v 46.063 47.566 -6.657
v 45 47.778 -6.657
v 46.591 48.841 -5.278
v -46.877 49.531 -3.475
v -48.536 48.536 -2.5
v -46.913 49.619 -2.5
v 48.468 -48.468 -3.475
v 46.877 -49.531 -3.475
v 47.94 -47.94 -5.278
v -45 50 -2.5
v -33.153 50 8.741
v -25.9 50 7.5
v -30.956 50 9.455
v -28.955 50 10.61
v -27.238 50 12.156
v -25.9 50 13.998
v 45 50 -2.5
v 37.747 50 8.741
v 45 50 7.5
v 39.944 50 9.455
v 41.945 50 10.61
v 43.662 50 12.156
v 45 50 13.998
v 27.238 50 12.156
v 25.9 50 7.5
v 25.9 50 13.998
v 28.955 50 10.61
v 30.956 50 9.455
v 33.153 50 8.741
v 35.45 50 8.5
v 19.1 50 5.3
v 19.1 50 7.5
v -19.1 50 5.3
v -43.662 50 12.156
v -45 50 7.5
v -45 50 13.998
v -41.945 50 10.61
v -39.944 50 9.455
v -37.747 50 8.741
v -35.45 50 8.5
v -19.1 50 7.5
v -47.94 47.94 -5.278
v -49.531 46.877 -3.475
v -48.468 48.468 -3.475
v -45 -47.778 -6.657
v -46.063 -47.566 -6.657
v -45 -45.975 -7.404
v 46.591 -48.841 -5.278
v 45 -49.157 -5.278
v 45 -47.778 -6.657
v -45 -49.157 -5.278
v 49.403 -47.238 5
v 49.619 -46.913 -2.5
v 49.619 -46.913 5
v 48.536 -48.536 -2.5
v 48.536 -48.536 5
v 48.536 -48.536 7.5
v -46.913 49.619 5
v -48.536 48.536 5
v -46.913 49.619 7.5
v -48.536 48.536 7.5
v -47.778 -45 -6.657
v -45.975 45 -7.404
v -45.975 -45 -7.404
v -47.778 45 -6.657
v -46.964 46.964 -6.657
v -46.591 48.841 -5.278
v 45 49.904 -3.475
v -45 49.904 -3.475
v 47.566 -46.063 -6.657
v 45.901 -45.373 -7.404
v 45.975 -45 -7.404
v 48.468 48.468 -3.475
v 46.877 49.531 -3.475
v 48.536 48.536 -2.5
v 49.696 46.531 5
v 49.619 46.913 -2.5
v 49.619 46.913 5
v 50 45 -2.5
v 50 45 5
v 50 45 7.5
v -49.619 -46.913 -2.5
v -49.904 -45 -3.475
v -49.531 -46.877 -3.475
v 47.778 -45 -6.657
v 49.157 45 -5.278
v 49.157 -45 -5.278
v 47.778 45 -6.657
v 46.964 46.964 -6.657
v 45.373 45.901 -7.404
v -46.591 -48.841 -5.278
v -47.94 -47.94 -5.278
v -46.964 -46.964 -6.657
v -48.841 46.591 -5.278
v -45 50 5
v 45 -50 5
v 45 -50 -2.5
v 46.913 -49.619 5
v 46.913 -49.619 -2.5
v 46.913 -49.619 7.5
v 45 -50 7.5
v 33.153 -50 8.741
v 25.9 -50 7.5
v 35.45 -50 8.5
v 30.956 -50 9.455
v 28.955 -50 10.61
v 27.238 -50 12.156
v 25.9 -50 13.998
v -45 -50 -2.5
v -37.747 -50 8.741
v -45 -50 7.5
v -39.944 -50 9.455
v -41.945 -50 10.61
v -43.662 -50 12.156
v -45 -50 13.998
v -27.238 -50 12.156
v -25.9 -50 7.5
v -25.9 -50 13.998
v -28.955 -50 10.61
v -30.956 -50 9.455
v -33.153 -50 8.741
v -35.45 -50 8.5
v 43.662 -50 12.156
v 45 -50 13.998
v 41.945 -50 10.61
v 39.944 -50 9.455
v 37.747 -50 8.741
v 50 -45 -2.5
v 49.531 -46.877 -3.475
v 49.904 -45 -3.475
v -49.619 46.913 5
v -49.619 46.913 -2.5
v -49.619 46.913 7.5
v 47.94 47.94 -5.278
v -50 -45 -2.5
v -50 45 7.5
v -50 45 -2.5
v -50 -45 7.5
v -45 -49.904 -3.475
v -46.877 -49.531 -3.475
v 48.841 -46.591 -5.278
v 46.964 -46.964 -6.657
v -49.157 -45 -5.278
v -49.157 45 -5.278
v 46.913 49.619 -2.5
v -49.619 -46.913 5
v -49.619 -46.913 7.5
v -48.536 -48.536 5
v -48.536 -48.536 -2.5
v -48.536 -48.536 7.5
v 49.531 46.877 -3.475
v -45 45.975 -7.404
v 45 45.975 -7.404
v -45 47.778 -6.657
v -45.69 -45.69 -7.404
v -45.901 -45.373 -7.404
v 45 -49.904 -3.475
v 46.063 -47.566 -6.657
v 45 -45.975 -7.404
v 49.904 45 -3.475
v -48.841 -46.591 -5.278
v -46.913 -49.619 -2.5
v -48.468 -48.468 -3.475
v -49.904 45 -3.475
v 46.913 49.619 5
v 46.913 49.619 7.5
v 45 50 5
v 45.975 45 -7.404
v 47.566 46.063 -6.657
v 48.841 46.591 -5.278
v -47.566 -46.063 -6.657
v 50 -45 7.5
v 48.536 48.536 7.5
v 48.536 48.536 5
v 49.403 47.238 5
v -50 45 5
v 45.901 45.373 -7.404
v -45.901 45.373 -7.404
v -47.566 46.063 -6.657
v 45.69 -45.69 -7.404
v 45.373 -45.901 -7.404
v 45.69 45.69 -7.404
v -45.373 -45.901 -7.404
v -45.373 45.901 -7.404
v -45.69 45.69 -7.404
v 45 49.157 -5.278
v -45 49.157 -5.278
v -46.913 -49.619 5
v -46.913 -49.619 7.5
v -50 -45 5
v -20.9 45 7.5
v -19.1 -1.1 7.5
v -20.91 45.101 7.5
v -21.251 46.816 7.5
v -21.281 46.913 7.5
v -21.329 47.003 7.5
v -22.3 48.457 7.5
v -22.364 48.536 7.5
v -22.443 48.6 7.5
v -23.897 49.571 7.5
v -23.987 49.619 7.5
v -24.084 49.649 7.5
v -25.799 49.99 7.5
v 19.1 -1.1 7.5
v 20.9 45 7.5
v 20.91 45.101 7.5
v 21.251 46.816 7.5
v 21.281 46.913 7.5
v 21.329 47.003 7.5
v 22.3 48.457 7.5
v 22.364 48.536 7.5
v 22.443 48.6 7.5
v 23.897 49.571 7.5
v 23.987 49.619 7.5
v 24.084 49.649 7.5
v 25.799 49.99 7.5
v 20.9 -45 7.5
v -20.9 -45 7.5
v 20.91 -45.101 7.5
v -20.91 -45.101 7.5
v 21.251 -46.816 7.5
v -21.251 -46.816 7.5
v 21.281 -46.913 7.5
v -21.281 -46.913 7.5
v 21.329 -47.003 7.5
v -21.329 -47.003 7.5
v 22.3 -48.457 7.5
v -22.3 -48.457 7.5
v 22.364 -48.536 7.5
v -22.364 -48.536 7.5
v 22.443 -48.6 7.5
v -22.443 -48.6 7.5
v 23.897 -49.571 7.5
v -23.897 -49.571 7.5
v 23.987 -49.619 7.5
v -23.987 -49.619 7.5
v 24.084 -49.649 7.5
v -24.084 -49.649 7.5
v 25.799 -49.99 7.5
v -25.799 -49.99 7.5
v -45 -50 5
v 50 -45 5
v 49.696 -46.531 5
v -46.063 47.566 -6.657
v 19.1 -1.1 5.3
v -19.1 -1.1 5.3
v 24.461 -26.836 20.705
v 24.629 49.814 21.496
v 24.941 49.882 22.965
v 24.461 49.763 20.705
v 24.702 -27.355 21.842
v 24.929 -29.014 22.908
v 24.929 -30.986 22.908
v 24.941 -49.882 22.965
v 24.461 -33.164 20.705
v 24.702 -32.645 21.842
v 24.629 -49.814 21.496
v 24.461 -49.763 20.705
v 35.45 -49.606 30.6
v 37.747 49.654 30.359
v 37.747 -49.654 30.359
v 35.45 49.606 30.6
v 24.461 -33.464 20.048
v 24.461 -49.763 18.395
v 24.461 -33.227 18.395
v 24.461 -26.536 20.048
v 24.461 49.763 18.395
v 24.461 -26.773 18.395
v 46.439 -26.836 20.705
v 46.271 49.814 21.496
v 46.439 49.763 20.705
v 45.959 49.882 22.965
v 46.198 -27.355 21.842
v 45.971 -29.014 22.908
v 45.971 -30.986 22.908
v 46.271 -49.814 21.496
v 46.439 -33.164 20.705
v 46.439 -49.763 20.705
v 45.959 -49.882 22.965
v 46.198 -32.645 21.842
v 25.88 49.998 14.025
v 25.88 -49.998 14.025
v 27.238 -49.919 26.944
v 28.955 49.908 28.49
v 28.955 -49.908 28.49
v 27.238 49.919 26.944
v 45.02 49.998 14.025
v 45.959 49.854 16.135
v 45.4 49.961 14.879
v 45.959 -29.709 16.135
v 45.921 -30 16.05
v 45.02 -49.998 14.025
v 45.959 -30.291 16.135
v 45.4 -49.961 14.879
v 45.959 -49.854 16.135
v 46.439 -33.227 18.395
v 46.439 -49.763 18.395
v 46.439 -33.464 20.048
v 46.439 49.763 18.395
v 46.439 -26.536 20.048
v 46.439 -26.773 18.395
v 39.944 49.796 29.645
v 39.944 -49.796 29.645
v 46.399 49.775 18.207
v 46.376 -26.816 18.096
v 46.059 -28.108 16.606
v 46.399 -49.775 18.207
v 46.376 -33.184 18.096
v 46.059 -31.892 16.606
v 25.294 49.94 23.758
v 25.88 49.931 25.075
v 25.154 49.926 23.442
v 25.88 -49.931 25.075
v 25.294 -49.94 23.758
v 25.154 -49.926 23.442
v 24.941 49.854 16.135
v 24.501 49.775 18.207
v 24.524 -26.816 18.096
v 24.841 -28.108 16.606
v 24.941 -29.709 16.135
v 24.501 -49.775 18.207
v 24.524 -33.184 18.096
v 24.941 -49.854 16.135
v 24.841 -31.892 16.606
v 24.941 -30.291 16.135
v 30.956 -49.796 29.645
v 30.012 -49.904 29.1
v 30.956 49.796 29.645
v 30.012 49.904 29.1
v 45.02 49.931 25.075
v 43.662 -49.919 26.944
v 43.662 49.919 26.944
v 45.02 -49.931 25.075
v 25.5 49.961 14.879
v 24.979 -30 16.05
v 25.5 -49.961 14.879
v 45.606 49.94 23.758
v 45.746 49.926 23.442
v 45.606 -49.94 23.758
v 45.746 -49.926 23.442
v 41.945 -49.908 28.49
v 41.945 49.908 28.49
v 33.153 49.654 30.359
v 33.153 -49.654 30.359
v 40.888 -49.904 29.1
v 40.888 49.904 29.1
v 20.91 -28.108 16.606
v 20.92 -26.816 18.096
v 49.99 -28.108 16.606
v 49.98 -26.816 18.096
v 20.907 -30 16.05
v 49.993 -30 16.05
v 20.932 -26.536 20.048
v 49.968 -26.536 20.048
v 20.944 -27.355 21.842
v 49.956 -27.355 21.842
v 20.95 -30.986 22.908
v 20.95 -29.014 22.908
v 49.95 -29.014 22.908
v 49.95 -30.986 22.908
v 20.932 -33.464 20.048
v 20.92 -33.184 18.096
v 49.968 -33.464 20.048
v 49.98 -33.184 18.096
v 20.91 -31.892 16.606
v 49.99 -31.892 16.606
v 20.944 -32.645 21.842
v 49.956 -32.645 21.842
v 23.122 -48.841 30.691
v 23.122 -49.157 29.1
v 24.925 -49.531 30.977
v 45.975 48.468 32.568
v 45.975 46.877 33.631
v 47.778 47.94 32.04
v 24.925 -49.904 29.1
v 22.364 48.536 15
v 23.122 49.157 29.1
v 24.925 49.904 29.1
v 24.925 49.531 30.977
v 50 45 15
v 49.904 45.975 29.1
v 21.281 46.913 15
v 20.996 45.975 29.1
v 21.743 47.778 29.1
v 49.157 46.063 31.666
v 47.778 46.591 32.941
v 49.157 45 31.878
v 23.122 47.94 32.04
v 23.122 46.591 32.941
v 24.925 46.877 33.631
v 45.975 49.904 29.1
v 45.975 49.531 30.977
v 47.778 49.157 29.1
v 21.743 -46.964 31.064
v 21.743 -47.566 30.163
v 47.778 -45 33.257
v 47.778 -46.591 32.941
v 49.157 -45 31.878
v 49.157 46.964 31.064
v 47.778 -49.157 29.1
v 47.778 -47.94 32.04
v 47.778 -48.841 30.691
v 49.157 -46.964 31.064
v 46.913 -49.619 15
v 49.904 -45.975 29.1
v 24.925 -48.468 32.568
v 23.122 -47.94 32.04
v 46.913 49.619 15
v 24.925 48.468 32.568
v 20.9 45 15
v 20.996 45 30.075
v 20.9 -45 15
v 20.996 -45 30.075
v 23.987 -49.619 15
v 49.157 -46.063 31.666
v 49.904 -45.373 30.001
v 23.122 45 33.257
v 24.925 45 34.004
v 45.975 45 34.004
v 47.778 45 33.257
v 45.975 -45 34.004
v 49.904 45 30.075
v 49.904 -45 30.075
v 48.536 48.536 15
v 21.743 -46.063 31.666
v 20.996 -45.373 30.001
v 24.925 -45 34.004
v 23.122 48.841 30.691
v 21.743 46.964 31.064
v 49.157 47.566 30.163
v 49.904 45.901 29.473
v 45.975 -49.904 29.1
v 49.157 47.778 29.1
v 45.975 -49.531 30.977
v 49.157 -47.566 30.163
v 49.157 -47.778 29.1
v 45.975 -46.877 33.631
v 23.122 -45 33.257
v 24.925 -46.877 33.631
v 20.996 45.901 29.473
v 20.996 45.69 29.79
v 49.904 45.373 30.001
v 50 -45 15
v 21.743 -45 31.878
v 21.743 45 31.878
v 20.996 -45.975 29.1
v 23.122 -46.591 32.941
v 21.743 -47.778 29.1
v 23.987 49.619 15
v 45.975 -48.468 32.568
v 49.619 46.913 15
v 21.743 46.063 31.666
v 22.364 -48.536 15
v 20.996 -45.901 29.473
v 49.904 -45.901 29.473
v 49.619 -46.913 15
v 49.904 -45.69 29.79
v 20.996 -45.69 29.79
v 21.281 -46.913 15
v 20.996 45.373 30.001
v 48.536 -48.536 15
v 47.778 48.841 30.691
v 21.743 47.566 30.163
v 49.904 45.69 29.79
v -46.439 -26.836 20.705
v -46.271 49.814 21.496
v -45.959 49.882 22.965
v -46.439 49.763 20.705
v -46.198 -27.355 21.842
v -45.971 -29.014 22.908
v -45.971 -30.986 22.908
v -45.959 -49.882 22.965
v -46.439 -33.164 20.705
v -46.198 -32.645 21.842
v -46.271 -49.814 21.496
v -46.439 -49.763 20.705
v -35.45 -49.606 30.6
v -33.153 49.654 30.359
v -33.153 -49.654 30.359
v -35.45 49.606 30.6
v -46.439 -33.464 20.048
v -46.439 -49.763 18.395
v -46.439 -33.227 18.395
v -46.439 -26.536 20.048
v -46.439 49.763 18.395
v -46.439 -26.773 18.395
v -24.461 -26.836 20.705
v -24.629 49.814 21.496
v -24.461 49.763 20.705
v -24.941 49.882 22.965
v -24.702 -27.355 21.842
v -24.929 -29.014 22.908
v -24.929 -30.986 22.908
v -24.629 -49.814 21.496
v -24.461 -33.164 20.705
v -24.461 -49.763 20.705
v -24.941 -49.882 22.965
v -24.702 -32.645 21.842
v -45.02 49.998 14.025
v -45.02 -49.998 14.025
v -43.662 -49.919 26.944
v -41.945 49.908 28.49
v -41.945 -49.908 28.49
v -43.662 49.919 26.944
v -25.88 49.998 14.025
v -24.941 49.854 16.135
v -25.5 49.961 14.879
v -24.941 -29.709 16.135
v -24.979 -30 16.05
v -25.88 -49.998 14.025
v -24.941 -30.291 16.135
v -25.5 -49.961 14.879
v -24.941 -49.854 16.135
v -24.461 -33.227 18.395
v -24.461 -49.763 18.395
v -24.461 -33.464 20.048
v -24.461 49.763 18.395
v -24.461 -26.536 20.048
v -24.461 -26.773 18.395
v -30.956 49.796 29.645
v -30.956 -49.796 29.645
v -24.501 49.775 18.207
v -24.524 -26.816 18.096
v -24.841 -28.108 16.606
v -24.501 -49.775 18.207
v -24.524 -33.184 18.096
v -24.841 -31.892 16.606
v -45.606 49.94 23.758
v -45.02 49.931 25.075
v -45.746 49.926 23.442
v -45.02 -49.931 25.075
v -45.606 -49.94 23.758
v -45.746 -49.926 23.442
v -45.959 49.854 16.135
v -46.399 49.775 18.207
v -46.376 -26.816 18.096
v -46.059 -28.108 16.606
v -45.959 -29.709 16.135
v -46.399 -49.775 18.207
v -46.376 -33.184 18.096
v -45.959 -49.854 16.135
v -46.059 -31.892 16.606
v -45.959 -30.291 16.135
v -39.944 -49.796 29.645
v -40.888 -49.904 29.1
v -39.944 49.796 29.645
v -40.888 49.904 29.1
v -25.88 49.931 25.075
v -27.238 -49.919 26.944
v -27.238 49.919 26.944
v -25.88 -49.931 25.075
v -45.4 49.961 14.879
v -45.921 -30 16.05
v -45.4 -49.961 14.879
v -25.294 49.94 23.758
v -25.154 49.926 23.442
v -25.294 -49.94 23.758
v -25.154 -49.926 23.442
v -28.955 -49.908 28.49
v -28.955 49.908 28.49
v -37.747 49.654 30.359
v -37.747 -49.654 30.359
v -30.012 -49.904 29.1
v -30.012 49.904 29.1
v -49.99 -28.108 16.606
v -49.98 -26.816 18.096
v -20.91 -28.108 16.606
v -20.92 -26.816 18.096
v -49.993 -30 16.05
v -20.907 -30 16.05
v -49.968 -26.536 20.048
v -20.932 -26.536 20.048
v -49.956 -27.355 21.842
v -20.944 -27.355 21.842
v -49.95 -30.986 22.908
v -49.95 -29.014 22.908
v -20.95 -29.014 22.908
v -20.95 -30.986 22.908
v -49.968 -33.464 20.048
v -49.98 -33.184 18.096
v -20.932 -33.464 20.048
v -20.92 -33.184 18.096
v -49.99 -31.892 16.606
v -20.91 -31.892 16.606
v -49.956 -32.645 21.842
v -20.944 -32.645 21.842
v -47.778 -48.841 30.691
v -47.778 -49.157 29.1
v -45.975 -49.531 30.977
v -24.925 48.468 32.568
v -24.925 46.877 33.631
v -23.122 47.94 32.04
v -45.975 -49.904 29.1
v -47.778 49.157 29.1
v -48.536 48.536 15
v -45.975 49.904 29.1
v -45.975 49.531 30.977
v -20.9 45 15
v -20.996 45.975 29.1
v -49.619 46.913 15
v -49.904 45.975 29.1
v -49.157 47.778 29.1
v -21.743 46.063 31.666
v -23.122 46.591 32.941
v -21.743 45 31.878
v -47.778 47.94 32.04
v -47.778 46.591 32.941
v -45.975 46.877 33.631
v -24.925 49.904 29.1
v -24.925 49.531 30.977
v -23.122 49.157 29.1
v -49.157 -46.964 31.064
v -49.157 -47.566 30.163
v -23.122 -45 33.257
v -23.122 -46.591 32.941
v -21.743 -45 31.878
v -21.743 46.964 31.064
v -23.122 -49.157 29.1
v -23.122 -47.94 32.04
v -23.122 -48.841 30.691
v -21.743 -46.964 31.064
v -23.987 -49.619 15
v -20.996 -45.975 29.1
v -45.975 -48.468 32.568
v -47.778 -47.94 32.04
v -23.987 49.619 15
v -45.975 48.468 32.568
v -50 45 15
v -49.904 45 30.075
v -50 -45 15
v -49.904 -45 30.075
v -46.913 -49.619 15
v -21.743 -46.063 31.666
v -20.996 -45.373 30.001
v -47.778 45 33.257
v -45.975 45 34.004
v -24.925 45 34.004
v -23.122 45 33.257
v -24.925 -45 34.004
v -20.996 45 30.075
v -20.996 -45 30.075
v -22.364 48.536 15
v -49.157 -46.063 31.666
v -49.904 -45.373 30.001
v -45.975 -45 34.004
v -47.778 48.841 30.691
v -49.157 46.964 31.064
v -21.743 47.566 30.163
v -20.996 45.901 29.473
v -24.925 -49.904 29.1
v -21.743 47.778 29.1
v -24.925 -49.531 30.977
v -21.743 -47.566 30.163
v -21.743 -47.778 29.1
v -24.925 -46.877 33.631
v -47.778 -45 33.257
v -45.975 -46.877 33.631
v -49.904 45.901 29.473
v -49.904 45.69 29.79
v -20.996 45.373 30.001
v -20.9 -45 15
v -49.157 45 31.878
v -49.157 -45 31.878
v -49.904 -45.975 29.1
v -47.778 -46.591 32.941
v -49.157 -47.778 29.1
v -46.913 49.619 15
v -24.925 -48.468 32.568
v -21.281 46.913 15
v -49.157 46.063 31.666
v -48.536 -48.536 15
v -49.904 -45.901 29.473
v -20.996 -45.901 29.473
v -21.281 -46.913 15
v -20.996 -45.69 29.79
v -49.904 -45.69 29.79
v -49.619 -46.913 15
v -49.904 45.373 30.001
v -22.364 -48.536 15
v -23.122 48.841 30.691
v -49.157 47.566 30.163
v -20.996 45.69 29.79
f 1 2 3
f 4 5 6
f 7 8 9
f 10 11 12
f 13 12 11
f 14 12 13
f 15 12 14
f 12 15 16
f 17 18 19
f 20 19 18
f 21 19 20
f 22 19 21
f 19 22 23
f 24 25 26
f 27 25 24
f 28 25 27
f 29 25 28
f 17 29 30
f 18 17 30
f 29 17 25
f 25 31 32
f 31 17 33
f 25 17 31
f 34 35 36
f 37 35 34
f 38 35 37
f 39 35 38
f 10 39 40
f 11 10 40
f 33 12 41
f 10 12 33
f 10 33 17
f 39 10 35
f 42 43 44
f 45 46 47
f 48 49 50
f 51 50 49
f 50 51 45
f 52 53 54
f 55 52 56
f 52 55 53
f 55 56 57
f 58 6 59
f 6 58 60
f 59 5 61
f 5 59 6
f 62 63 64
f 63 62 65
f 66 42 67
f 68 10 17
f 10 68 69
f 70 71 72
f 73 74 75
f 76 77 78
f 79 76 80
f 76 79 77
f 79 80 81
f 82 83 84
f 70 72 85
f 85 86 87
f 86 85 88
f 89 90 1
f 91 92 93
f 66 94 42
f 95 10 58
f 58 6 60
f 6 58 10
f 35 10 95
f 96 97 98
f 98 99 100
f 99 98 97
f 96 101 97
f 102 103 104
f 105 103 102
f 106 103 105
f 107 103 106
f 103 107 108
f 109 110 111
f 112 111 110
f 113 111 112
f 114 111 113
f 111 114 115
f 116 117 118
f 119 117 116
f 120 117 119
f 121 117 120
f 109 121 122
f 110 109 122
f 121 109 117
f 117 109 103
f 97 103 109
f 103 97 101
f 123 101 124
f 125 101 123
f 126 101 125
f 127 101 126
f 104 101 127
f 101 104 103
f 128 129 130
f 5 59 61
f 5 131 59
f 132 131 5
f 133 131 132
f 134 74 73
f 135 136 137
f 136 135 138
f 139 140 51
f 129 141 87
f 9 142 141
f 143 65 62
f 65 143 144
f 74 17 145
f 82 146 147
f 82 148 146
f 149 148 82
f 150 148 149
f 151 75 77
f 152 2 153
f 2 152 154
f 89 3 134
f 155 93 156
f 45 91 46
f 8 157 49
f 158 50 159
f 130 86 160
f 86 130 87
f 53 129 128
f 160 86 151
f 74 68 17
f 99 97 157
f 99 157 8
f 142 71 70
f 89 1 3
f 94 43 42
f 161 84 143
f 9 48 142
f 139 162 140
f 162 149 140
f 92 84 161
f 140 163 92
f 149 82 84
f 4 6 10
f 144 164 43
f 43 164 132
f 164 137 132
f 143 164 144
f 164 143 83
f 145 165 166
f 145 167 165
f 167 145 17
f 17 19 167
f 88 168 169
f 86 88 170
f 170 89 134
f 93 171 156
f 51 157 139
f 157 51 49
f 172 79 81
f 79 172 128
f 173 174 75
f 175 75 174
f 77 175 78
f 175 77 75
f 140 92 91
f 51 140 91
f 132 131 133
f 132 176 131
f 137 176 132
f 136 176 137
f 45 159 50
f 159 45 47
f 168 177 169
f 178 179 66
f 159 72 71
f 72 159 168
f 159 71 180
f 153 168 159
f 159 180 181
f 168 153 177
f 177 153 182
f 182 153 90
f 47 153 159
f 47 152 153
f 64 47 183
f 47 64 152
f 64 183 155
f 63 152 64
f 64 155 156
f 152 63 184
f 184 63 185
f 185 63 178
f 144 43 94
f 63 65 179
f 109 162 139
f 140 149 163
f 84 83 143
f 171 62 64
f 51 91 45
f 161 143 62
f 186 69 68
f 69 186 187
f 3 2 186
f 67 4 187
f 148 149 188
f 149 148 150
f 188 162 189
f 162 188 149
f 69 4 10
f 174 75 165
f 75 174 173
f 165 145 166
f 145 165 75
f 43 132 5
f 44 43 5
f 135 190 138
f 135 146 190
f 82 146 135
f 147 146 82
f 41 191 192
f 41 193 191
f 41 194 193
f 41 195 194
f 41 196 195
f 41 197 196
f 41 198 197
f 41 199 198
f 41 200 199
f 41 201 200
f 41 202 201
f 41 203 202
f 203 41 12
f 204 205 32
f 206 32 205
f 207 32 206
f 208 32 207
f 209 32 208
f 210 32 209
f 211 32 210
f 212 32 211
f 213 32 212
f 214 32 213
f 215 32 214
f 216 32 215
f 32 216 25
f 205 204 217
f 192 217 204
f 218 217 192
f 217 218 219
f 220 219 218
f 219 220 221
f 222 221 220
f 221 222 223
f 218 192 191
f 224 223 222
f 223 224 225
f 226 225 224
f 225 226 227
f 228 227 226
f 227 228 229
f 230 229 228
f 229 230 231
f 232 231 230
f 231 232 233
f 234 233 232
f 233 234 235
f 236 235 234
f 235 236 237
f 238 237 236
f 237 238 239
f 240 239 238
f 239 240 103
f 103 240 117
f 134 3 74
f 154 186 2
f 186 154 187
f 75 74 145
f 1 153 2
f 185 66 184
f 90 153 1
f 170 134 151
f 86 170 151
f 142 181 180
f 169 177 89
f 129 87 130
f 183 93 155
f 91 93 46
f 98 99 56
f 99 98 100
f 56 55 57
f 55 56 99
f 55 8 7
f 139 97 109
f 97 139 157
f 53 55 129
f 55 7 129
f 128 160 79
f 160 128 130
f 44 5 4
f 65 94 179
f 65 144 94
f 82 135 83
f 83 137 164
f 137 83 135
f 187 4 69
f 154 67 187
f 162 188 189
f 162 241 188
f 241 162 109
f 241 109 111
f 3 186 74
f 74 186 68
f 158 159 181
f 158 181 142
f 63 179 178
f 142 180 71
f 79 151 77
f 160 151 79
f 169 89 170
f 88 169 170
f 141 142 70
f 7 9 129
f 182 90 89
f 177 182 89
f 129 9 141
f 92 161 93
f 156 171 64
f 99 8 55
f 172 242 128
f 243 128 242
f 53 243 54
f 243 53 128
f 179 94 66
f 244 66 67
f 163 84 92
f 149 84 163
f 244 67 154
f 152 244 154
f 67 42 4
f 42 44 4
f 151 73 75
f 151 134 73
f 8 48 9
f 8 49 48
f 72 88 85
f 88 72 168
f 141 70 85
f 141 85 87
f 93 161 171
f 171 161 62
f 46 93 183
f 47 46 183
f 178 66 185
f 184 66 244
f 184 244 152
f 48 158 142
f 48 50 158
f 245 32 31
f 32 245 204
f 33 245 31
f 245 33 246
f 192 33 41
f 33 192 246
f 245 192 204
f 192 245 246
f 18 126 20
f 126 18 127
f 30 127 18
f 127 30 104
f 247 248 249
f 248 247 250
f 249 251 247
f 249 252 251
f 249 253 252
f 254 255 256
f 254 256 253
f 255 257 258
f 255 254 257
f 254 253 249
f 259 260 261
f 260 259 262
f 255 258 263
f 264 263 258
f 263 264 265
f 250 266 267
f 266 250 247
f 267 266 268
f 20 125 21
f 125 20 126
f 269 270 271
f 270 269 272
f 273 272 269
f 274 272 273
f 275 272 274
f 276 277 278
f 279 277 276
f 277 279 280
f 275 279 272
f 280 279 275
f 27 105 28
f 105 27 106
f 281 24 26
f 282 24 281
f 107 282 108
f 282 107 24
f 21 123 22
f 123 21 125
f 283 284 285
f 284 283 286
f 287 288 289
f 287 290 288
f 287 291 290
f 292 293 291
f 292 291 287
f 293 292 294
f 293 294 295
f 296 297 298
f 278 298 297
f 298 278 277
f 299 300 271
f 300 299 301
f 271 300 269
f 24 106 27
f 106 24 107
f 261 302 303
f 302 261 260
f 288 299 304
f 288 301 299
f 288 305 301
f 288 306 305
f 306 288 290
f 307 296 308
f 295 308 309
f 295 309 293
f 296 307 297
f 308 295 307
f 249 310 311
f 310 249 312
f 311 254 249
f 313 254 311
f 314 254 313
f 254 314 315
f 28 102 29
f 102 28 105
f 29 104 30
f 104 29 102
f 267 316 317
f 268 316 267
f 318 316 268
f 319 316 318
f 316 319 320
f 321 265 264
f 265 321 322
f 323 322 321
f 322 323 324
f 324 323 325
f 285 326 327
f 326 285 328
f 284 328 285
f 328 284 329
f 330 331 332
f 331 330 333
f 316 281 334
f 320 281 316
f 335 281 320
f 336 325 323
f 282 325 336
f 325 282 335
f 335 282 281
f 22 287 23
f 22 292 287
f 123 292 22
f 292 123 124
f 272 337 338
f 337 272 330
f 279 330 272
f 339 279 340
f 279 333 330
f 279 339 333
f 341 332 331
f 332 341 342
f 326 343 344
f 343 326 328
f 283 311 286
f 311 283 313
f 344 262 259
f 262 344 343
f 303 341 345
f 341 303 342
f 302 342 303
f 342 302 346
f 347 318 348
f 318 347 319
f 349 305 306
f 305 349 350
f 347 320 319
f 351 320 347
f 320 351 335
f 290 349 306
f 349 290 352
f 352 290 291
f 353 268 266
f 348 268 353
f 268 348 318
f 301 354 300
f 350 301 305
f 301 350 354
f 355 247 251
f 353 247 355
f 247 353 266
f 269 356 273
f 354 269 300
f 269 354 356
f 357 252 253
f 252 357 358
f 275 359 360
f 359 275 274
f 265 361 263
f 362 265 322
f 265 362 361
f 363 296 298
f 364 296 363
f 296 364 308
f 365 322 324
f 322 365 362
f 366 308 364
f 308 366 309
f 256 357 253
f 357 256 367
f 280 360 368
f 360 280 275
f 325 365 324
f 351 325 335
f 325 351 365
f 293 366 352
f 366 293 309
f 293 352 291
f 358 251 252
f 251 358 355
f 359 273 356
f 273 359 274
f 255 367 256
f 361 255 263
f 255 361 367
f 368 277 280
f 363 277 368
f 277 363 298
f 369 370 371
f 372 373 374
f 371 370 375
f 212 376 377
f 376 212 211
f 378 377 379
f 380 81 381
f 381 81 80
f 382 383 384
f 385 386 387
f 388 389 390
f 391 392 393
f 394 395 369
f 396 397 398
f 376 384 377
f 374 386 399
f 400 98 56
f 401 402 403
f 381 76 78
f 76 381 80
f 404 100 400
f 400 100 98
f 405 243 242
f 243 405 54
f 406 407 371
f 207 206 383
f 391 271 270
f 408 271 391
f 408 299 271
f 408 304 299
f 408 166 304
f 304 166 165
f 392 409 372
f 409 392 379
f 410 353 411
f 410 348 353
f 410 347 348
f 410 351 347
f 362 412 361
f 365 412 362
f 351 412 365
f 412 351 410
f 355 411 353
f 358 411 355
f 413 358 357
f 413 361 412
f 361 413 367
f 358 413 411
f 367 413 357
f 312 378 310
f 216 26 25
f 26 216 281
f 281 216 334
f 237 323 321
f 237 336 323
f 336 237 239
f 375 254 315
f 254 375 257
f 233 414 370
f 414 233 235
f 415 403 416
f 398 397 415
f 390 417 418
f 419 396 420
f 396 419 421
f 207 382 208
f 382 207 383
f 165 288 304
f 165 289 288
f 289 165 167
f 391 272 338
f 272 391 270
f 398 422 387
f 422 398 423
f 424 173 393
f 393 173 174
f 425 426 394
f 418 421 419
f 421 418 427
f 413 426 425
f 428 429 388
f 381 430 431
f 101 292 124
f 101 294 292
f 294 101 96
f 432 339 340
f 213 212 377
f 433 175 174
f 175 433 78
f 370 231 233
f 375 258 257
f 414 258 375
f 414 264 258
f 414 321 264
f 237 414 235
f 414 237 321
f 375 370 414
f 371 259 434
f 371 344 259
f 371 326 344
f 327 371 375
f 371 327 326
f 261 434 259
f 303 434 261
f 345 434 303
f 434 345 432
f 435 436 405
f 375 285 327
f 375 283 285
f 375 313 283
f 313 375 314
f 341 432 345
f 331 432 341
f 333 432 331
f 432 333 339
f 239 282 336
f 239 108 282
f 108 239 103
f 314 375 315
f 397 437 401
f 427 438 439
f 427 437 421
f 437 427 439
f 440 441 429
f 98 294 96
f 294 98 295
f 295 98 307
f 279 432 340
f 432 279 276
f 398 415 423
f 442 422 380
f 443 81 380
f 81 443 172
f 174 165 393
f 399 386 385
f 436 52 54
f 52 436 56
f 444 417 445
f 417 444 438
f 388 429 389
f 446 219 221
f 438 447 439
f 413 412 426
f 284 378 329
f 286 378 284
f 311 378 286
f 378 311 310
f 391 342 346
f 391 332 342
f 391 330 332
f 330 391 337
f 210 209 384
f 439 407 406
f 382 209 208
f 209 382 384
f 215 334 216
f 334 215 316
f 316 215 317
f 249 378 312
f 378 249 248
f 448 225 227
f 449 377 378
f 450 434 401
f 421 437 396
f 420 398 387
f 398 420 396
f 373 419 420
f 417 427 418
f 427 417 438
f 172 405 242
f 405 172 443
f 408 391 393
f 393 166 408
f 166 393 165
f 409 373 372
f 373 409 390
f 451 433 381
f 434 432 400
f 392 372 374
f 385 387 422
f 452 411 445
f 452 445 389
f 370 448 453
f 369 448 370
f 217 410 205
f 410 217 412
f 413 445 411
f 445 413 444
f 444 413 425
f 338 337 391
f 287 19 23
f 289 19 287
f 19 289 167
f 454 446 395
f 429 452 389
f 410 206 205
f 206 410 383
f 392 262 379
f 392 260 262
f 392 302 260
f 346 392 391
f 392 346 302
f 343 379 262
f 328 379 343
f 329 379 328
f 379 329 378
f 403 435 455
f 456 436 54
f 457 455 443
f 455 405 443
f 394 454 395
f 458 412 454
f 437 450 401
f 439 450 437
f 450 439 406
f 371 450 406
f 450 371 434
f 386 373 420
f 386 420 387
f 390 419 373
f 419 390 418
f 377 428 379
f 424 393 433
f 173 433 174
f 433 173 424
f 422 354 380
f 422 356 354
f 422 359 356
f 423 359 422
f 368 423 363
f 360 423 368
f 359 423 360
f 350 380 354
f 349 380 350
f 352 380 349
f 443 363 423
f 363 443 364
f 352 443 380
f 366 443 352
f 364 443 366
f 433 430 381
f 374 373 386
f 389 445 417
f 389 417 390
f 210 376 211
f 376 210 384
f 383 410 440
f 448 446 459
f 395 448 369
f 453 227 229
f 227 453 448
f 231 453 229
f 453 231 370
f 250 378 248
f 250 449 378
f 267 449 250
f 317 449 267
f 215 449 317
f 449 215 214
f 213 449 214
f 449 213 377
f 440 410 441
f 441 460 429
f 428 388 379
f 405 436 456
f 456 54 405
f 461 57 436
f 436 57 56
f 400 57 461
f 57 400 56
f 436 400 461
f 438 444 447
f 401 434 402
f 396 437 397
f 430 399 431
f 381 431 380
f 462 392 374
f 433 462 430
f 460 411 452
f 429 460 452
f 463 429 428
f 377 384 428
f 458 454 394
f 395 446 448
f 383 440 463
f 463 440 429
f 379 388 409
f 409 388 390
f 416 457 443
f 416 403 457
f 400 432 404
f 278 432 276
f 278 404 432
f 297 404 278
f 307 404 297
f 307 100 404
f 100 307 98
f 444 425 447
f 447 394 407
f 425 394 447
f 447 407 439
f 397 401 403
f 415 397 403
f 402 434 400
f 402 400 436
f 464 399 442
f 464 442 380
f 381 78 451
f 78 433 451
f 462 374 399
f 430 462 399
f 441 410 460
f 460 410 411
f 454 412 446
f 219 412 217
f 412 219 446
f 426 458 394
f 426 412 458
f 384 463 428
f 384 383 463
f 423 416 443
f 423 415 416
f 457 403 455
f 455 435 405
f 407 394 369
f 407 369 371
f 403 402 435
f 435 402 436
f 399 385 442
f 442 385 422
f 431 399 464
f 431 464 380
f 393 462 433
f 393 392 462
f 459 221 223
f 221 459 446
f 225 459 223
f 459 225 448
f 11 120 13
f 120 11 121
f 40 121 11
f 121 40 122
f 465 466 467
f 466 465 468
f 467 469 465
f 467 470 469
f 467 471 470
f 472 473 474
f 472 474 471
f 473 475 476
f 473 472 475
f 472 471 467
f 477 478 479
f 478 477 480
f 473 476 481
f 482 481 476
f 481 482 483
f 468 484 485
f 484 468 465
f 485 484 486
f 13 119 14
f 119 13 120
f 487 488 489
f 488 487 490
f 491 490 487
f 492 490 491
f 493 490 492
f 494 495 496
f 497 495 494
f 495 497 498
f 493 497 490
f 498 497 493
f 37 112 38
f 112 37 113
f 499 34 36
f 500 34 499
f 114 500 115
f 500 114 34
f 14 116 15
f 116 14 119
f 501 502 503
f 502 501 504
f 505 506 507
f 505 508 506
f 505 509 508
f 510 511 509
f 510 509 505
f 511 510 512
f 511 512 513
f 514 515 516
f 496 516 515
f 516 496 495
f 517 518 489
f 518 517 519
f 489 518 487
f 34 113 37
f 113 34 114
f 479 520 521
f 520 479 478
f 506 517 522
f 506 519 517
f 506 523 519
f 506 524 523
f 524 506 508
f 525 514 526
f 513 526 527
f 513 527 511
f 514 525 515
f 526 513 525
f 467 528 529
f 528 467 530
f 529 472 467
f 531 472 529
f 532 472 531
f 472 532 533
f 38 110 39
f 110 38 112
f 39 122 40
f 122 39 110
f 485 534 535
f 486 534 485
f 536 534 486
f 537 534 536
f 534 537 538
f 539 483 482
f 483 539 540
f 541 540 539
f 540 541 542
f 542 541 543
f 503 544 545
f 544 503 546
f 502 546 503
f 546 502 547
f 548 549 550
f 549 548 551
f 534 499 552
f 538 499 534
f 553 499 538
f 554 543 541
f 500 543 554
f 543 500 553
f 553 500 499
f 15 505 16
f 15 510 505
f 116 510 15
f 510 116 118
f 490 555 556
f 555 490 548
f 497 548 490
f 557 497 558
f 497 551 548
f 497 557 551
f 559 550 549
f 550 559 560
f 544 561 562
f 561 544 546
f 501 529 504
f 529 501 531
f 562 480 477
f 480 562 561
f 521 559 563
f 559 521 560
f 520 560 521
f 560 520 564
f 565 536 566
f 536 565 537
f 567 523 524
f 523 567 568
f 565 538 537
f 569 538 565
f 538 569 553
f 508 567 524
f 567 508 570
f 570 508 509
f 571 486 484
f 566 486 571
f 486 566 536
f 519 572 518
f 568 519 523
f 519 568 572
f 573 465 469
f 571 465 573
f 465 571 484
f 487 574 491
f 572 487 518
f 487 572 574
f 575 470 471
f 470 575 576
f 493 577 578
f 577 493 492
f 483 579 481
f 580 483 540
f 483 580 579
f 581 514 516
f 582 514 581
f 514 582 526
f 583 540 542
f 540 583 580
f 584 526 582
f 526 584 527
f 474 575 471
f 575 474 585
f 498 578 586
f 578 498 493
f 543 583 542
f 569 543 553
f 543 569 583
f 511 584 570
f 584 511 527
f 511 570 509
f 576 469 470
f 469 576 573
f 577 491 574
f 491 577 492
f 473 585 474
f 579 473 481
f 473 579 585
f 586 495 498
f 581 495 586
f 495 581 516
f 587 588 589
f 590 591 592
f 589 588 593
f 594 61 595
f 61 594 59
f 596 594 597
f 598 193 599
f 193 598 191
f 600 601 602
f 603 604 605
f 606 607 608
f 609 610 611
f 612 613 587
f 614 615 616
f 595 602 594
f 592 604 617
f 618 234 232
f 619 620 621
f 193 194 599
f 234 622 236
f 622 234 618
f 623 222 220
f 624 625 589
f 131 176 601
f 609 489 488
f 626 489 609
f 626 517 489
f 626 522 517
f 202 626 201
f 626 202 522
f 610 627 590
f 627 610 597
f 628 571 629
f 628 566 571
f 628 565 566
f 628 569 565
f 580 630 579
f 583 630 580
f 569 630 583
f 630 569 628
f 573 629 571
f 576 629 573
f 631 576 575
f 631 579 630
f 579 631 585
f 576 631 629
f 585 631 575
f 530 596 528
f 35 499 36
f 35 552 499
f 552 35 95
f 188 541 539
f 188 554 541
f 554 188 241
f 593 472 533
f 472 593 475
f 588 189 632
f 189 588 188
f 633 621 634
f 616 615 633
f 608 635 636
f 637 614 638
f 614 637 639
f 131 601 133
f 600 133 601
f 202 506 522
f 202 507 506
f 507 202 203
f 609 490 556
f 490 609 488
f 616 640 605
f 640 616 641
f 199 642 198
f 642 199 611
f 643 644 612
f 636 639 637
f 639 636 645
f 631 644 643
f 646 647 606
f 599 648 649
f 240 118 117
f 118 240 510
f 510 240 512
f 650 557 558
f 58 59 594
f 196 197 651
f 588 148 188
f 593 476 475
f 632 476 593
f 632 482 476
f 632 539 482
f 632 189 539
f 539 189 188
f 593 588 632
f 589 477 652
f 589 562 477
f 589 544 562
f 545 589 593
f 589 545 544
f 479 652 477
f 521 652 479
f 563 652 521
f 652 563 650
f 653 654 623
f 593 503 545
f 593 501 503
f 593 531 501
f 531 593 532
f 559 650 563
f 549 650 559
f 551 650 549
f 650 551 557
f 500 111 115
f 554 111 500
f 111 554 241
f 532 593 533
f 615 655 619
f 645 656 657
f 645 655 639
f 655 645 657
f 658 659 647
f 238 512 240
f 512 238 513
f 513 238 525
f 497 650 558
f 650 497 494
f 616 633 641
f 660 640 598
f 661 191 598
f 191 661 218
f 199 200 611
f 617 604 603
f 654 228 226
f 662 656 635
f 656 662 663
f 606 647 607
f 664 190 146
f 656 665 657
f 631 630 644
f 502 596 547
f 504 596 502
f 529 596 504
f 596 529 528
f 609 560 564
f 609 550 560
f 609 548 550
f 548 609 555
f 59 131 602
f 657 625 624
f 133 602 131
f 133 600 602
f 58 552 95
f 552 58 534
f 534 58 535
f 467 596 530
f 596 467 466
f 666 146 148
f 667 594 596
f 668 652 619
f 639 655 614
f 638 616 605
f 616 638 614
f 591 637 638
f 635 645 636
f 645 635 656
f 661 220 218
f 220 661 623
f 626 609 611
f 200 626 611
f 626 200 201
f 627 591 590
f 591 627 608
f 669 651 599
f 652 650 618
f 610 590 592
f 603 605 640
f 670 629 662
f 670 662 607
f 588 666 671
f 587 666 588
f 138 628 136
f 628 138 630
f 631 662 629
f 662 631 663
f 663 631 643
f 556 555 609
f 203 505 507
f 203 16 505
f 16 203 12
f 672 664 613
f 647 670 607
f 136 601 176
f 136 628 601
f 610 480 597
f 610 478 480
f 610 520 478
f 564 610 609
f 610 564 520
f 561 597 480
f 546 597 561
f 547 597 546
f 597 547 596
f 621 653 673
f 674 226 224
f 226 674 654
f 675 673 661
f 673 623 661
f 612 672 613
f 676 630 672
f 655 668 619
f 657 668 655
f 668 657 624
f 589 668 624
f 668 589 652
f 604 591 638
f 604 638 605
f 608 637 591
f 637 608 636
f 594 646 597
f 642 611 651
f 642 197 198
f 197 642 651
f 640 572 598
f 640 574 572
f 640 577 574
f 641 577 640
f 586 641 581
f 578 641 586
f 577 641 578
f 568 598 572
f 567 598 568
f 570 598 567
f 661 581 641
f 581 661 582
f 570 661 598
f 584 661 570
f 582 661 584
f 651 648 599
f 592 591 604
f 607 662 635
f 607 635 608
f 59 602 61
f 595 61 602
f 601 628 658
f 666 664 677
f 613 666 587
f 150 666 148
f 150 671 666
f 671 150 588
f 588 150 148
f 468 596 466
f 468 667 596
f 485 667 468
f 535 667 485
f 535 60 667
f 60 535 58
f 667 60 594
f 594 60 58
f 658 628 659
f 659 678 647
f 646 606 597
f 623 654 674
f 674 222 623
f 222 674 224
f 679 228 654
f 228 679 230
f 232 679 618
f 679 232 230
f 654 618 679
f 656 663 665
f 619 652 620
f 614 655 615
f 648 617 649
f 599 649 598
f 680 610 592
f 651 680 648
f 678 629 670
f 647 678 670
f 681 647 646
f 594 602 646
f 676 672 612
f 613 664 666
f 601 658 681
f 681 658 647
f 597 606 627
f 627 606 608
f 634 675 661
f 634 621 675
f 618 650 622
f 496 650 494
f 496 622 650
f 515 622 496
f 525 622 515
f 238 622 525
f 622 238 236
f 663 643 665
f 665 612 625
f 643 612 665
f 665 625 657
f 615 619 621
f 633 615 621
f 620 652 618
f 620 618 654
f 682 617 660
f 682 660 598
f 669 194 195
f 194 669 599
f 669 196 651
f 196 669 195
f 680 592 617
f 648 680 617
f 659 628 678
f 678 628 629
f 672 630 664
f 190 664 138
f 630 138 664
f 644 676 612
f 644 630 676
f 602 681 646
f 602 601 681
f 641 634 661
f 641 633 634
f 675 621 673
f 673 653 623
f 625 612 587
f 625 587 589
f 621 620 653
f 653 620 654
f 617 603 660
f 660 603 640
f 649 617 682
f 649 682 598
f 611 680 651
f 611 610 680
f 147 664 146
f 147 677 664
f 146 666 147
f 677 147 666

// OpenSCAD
// file: modules/roundedcube.scad
// More information: https://danielupshaw.com/openscad-rounded-corners/

module roundedcube(size = [1, 1, 1], center = false, radius = 0.5, apply_to = "all") {
	// If single value, convert to [x, y, z] vector
	size = (size[0] == undef) ? [size, size, size] : size;

	translate_min = radius;
	translate_xmax = size[0] - radius;
	translate_ymax = size[1] - radius;
	translate_zmax = size[2] - radius;

	diameter = radius * 2;

	obj_translate = (center == false) ?
		[0, 0, 0] : [
			-(size[0] / 2),
			-(size[1] / 2),
			-(size[2] / 2)
		];

	translate(v = obj_translate) {
		hull() {
			for (translate_x = [translate_min, translate_xmax]) {
				x_at = (translate_x == translate_min) ? "min" : "max";
				for (translate_y = [translate_min, translate_ymax]) {
					y_at = (translate_y == translate_min) ? "min" : "max";
					for (translate_z = [translate_min, translate_zmax]) {
						z_at = (translate_z == translate_min) ? "min" : "max";

						translate(v = [translate_x, translate_y, translate_z])
						if (
							(apply_to == "all") ||
							(apply_to == "xmin" && x_at == "min") || (apply_to == "xmax" && x_at == "max") ||
							(apply_to == "ymin" && y_at == "min") || (apply_to == "ymax" && y_at == "max") ||
							(apply_to == "zmin" && z_at == "min") || (apply_to == "zmax" && z_at == "max")
						) {
							sphere(r = radius);
						} else {
							rotate = 
								(apply_to == "xmin" || apply_to == "xmax" || apply_to == "x") ? [0, 90, 0] : (
								(apply_to == "ymin" || apply_to == "ymax" || apply_to == "y") ? [90, 90, 0] :
								[0, 0, 0]
							);
							rotate(a = rotate)
							cylinder(h = diameter, r = radius, center = true);
						}
					}
				}
			}
		}
	}
}
// file: parameters/commonParameters.scad
// All measurements in millimeters

// "horizontal" and "vertical" refer to how they are printed on the print bed,
// not how they work on the final assembly.
// ALWAYS print verticle pipes straight up if possible, that is 90 degrees from the bed.
// Attempting to print a slanted pipe will be troublesome and require testing for a proper size.
// However, you can print ANY angle ON the bed.

// 1.25" PVC Pipe:
horizontalPipeInsideDiameter_1_25pvc = 42.9;
verticalPipeInsideDiameter_1_25pvc = 42.5;

// 0.5" PVC Pipe:
horizontalPipeInsideDiameter_0_50pvc = 22.1;
verticalPipeInsideDiameter_0_50pvc = 21.7;

// Parameters
jointLegLength = 50;
jointWallThickness = 3.5;
jointPinningHoleDiameter = 7;
jointPinHoleOffset = 10;

// Walker Foot Parameters
inchesToMmConversionFactor = 25.4;

// Current idea is 11 x 21 inches.
walkerFootHeight = 11 * inchesToMmConversionFactor;
walkerFootLength = 21 * inchesToMmConversionFactor;
// Back of Foot is 4 inches longer to cause foot to hang AND LOOK as desired
// I tried 1 inch and it had basically NO affect on how it hangs.
// I think it looks cool at 4 inches, so I am going to test that.
// I *THINK* that it actually doesn't affect lenght of the walker, because the front
// of one compensates for the back of the other.
walkerFootCenterOffset = 0 * inchesToMmConversionFactor; // Remember to multiply any offset by the conversion factor.
walkerFootFrontLength = (walkerFootLength / 2) - (walkerFootCenterOffset / 2);
walkerFootBackLength = (walkerFootLength / 2) + (walkerFootCenterOffset / 2);

footLowerJointLegLength = 75;

// Angles
// This site is great for visualizing what you want: https://www.blocklayer.com/trig/scaleneeng.aspx
// Use this site to check your math and results: https://www.calculator.net/right-triangle-calculator.html
//echo("=======================================================");
//echo("Walker Foot Parameters");
//echo("walkerFootLength", walkerFootLength, walkerFootFrontLength + walkerFootBackLength);
//echo("=======================================================");
//echo("Front:");
//echo("walkerFootHeight (a)", walkerFootHeight);
//echo("walkerFootFrontLength (b)", walkerFootFrontLength);
//walkerFootFrontTriangleTopLength = sqrt(pow(walkerFootHeight, 2) + pow(walkerFootFrontLength, 2));
//echo("walkerFootFrontTriangleTopLength (c)", walkerFootFrontTriangleTopLength);
//walkerFootFrontJointAngle = asin(walkerFootHeight / walkerFootFrontTriangleTopLength);
//echo("walkerFootFrontJointAngle (α):", walkerFootFrontJointAngle);
//walkerAnkleFrontAngle = asin(walkerFootFrontLength / walkerFootFrontTriangleTopLength);
//echo("walkerAnkleFrontAngle (β)", walkerAnkleFrontAngle);
//echo("-------------------------------------------------------");
//echo("Back");
//echo("walkerFootBackLength (b)", walkerFootBackLength);
//walkerFootBackTriangleTopLength = sqrt(pow(walkerFootHeight, 2) + pow(walkerFootBackLength, 2));
//echo("walkerFootBackTriangleTopLength (c)", walkerFootBackTriangleTopLength);
//walkerFootBackJointAngle = asin(walkerFootHeight / walkerFootBackTriangleTopLength);
//echo("walkerFootBackJointAngle (α):", walkerFootBackJointAngle);
//walkerAnkleBackAngle = asin(walkerFootBackLength / walkerFootBackTriangleTopLength);
//echo("walkerAnkleBackAngle (β)", walkerAnkleBackAngle);
//echo("=======================================================");



// This height is purely based on giving space for nice triangles supports.
// It could be shorter, just be sure to adjust the triangles.
walkerBodyLowerShaftHolderRollerBearingHeightAboveThrustBearing = 50;

// 12v Battery Box
batteryHolderWallThickness = 5;

// Battery Dimensions
// https://www.power-sonic.com/product/ps-1290/
batteryHeight = 94;
batteryWidth = 65.6; // Ben uses 65.6, Web Site says 65
batteryLength = 150.6; // Ben uses 150.6, Web site says 141
batteryBoxDepth = 60; // This is arbitrary. Ben uses 60 for the Dalek

// Colors
JointColor = "CornflowerBlue";
PipeColor = "Pink";

// Resoution
// This is perfect for 3D Printing,
// but you may want to comment it out while working to improve preview
// performance
//$fa = 1;
//$fs = 0.4;
// Although this makes it VERY high rez, which might be better for the slicer? Experimenting with it instead.
// NOTE that using $fn causes FreeCAD and hence .step files exported to Fusion 360 to show round items as a series of faces instead of a single object.
//$fn = 500;
// main file
// Load in some defaults
include <parameters/commonParameters.scad>;

include <modules/roundedcube.scad>;

shoulderSquareWidth = 100;
shoulderBlockHeight = 5;
motorMountDepth = 52.2;
motorMountWidth = 38.2;

difference() {
    roundedcube([shoulderSquareWidth, shoulderSquareWidth, shoulderBlockHeight], true, shoulderBlockHeight, "zmax");

    // Motor bracket cutout
    translate([0, shoulderSquareWidth / 2 - 25, shoulderBlockHeight * 2 - 2.2])
        cube([motorMountWidth, motorMountDepth, shoulderBlockHeight], true);
}

pipeHolderWidth = (horizontalPipeInsideDiameter_0_50pvc) + (jointWallThickness * 2);

module automatonJointPipeHolder(oppositeSide = 1) {
    rotate([0, 90, 0])
        translate([- ((pipeHolderWidth / 2) + (shoulderBlockHeight)), 0, oppositeSide * ((shoulderSquareWidth / 2) - (
            pipeHolderWidth / 2))])
            difference() {
                roundedcube([pipeHolderWidth, shoulderSquareWidth, pipeHolderWidth], true, 5, "xmin");
                union() {
                    rotate([90, 0, 0])
                        cylinder(d = horizontalPipeInsideDiameter_0_50pvc, h = shoulderSquareWidth + 10, center = true);
                    // Make a hole near the end of the leg for pinning
                    // The -0.01 ensures that the end of the tube is clear.
                    rotate([0, 0, 0])
                        translate([0, - ((shoulderSquareWidth / 2) - (jointPinHoleOffset * 2)), 0])
                            cylinder(
                            h = pipeHolderWidth + 0.01 + 100, d = jointPinningHoleDiameter, center
                            = true);
                }
            }
}

automatonJointPipeHolder();
automatonJointPipeHolder(- 1);
